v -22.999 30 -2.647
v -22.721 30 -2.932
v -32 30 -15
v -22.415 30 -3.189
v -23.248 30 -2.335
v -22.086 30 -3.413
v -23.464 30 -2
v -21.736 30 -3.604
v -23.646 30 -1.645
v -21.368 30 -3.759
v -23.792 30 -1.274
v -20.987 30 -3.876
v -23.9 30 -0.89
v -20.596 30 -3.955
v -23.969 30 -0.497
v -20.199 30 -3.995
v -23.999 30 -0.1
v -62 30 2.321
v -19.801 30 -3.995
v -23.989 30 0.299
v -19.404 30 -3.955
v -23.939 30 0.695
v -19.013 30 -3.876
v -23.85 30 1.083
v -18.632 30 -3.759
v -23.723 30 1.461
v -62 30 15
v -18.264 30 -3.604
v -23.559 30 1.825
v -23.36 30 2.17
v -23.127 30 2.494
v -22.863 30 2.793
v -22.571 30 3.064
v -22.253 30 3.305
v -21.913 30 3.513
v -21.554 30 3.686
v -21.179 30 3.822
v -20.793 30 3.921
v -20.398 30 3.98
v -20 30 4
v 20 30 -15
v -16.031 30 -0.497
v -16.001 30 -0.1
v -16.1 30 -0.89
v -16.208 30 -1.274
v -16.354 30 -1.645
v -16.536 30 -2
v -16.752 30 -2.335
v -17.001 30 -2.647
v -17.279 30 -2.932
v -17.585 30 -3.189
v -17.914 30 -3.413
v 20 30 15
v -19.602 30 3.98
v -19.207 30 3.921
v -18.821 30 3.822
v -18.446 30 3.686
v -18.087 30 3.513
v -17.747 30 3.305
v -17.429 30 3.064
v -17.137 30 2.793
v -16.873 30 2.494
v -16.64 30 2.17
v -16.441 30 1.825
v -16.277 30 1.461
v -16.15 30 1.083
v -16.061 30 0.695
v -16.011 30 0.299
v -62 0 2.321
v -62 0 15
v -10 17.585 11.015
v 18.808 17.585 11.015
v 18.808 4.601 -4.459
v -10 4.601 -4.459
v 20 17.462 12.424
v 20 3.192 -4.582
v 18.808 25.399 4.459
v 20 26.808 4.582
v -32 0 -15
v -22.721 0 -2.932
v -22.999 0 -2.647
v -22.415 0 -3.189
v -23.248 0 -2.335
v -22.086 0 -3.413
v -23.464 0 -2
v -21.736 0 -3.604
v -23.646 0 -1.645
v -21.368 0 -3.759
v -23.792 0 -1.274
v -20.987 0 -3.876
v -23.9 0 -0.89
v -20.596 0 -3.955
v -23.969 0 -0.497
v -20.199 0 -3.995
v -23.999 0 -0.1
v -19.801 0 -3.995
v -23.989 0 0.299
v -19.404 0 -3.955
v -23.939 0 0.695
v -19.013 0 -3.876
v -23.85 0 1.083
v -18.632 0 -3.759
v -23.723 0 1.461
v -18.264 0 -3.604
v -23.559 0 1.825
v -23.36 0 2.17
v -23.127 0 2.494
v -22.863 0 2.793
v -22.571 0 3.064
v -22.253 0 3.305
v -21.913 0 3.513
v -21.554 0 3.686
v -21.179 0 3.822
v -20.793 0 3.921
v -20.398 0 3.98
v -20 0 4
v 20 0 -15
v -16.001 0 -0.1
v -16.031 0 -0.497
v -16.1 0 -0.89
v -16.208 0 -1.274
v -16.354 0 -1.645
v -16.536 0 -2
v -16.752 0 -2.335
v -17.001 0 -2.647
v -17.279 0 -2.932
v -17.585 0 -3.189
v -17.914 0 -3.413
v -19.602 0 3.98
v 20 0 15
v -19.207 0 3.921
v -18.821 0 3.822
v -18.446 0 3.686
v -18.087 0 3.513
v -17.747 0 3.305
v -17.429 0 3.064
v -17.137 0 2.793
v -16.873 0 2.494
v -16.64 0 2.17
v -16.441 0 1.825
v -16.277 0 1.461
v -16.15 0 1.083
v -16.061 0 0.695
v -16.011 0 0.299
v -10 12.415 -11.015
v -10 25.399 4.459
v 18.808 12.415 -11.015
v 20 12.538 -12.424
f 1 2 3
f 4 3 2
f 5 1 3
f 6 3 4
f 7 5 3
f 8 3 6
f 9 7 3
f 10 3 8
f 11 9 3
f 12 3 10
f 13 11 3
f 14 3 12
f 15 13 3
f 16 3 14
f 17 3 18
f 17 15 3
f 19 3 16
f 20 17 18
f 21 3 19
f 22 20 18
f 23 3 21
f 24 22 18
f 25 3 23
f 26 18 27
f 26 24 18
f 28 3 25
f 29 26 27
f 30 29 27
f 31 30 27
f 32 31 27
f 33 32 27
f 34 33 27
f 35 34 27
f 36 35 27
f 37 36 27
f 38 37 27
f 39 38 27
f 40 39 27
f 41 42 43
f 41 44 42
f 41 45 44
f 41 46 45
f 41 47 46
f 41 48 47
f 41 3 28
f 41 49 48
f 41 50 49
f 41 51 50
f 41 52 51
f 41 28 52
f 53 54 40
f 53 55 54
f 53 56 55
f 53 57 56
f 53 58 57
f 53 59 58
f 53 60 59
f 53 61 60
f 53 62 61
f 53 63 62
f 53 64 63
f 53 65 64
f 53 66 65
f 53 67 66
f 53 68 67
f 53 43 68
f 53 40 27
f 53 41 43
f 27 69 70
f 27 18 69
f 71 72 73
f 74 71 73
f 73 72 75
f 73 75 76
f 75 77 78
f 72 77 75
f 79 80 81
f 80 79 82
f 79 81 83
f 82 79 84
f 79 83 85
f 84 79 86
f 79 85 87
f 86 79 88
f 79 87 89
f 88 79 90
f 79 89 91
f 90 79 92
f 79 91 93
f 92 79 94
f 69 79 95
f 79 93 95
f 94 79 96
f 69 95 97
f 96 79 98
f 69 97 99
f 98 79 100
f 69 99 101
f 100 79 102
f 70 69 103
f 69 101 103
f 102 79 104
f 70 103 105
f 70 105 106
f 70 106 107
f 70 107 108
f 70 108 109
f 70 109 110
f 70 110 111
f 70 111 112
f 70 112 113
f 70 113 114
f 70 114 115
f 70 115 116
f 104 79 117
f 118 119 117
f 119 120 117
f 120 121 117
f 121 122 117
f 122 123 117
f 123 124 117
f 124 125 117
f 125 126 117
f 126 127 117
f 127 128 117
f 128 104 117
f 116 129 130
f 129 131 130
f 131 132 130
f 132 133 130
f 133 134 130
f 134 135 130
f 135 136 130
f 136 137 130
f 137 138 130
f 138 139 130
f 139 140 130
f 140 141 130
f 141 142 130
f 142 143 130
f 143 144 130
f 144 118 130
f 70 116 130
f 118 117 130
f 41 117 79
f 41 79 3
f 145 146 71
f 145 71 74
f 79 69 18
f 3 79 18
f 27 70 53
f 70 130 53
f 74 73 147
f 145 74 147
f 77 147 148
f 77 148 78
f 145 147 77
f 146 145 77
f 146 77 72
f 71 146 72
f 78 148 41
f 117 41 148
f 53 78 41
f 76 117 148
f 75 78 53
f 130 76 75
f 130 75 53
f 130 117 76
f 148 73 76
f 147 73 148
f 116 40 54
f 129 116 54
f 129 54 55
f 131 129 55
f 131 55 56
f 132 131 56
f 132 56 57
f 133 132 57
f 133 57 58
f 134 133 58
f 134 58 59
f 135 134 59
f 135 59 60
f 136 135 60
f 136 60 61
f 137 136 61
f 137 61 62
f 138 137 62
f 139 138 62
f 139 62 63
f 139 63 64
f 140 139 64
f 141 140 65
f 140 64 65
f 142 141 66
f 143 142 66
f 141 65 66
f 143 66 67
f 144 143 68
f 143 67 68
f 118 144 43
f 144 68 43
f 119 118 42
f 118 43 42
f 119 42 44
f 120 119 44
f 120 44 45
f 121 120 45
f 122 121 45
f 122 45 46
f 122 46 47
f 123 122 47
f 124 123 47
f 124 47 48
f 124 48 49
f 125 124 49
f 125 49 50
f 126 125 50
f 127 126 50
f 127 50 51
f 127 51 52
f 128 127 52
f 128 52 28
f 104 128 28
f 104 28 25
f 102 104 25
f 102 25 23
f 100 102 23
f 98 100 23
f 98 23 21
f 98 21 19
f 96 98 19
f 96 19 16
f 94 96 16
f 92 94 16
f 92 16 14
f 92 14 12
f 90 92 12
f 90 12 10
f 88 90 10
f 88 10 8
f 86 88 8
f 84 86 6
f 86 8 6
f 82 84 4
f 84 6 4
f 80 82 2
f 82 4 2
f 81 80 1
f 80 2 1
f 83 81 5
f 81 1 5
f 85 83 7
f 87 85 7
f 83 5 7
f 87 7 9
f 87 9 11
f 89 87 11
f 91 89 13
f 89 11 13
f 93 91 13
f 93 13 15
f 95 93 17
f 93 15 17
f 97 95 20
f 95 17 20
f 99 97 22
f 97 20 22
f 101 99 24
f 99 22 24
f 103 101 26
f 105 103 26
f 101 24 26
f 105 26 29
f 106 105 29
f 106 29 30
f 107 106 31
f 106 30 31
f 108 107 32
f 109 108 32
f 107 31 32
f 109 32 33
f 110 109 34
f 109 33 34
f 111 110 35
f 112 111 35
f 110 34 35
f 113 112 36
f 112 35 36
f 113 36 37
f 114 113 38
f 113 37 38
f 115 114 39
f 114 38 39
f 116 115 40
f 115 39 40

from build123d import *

# Parameters (mm, degrees)
EXTRUDE_1_DEPTH     = 30
SKETCH_2_R          = 4
CUT_EXTRUDE_1_DEPTH = 31
CUT_EXTRUDE_4_DEPTH = 30
SKETCH1_W           = 30
SKETCH1_H           = 30
BOSS_EXTRUDE1_DEPTH = 27
CHAMFER1_SIZE       = 30
CHAMFER1_SIZE2      = 17.320508076
CHAMFER2_SIZE       = 1
CHAMFER2_SIZE2      = 1.191753593


with BuildPart() as part:
    # Эскиз1 → Бобышка-Вытянуть1 (new body)
    with BuildSketch(Plane(origin=(0, 0, 0), x_dir=(1, 0, 0), z_dir=(0, 1, 0))):
        Polygon((-20, -15), (-35, -15), (-35, 15), (-20, 15), (20, 15), (20, -15), align=None)
    extrude(amount=EXTRUDE_1_DEPTH)

    # Эскиз2 → Вырез-Вытянуть1 (cut, through all)
    with BuildSketch(Plane(origin=(0, 30, 0), x_dir=(1, 0, 0), z_dir=(0, 1, 0))):
        with Locations(Location((-20, 0, 0), (0, 0, 270))):  # turned: the seam where the file's is
            Circle(SKETCH_2_R)
    extrude(amount=-CUT_EXTRUDE_1_DEPTH, mode=Mode.SUBTRACT)

    # Эскиз5 → Вырез-Вытянуть4 (cut)
    with BuildSketch(Plane(origin=(20, 0, 0), x_dir=(0, 0, -1), z_dir=(1, 0, 0))):
        Polygon((4.458832066, 4.601018482), (11.015265685, 12.414671802), (-4.458832066, 25.398981518), (-11.015265685, 17.585328198), align=None)
    extrude(amount=-CUT_EXTRUDE_4_DEPTH, mode=Mode.SUBTRACT)

    # Sketch1 → Boss-Extrude1 (add)
    with BuildSketch(Plane.ZY.offset(35)):
        with Locations((0, 15)):
            Rectangle(SKETCH1_W, SKETCH1_H)
    extrude(amount=BOSS_EXTRUDE1_DEPTH)

    # Chamfer1
    chamfer1_edges = [part.edges().sort_by_distance(p)[0] for p in [
        (-62, 15, -15),
    ]]
    chamfer1_side = [part.faces().sort_by_distance(p)[0] for p in [
        (-21, 15, -15),
    ]]
    chamfer(chamfer1_edges, length=CHAMFER1_SIZE, length2=CHAMFER1_SIZE2, reference=chamfer1_side[0])

    # Chamfer2
    chamfer2_edges = [part.edges().sort_by_distance(p)[0] for p in [
        (20, 18.90682666, -3.278216809),
        (20, 21.492154858, 7.737048876),
        (20, 11.09317334, 3.278216809),
        (20, 8.507845142, -7.737048876),
    ]]
    chamfer2_side = [part.faces().sort_by_distance(p)[0] for p in [
        (20, 15, -14.575735931),
    ]]
    chamfer(chamfer2_edges, length=CHAMFER2_SIZE, length2=CHAMFER2_SIZE2, reference=chamfer2_side[0])


solid = part.part
